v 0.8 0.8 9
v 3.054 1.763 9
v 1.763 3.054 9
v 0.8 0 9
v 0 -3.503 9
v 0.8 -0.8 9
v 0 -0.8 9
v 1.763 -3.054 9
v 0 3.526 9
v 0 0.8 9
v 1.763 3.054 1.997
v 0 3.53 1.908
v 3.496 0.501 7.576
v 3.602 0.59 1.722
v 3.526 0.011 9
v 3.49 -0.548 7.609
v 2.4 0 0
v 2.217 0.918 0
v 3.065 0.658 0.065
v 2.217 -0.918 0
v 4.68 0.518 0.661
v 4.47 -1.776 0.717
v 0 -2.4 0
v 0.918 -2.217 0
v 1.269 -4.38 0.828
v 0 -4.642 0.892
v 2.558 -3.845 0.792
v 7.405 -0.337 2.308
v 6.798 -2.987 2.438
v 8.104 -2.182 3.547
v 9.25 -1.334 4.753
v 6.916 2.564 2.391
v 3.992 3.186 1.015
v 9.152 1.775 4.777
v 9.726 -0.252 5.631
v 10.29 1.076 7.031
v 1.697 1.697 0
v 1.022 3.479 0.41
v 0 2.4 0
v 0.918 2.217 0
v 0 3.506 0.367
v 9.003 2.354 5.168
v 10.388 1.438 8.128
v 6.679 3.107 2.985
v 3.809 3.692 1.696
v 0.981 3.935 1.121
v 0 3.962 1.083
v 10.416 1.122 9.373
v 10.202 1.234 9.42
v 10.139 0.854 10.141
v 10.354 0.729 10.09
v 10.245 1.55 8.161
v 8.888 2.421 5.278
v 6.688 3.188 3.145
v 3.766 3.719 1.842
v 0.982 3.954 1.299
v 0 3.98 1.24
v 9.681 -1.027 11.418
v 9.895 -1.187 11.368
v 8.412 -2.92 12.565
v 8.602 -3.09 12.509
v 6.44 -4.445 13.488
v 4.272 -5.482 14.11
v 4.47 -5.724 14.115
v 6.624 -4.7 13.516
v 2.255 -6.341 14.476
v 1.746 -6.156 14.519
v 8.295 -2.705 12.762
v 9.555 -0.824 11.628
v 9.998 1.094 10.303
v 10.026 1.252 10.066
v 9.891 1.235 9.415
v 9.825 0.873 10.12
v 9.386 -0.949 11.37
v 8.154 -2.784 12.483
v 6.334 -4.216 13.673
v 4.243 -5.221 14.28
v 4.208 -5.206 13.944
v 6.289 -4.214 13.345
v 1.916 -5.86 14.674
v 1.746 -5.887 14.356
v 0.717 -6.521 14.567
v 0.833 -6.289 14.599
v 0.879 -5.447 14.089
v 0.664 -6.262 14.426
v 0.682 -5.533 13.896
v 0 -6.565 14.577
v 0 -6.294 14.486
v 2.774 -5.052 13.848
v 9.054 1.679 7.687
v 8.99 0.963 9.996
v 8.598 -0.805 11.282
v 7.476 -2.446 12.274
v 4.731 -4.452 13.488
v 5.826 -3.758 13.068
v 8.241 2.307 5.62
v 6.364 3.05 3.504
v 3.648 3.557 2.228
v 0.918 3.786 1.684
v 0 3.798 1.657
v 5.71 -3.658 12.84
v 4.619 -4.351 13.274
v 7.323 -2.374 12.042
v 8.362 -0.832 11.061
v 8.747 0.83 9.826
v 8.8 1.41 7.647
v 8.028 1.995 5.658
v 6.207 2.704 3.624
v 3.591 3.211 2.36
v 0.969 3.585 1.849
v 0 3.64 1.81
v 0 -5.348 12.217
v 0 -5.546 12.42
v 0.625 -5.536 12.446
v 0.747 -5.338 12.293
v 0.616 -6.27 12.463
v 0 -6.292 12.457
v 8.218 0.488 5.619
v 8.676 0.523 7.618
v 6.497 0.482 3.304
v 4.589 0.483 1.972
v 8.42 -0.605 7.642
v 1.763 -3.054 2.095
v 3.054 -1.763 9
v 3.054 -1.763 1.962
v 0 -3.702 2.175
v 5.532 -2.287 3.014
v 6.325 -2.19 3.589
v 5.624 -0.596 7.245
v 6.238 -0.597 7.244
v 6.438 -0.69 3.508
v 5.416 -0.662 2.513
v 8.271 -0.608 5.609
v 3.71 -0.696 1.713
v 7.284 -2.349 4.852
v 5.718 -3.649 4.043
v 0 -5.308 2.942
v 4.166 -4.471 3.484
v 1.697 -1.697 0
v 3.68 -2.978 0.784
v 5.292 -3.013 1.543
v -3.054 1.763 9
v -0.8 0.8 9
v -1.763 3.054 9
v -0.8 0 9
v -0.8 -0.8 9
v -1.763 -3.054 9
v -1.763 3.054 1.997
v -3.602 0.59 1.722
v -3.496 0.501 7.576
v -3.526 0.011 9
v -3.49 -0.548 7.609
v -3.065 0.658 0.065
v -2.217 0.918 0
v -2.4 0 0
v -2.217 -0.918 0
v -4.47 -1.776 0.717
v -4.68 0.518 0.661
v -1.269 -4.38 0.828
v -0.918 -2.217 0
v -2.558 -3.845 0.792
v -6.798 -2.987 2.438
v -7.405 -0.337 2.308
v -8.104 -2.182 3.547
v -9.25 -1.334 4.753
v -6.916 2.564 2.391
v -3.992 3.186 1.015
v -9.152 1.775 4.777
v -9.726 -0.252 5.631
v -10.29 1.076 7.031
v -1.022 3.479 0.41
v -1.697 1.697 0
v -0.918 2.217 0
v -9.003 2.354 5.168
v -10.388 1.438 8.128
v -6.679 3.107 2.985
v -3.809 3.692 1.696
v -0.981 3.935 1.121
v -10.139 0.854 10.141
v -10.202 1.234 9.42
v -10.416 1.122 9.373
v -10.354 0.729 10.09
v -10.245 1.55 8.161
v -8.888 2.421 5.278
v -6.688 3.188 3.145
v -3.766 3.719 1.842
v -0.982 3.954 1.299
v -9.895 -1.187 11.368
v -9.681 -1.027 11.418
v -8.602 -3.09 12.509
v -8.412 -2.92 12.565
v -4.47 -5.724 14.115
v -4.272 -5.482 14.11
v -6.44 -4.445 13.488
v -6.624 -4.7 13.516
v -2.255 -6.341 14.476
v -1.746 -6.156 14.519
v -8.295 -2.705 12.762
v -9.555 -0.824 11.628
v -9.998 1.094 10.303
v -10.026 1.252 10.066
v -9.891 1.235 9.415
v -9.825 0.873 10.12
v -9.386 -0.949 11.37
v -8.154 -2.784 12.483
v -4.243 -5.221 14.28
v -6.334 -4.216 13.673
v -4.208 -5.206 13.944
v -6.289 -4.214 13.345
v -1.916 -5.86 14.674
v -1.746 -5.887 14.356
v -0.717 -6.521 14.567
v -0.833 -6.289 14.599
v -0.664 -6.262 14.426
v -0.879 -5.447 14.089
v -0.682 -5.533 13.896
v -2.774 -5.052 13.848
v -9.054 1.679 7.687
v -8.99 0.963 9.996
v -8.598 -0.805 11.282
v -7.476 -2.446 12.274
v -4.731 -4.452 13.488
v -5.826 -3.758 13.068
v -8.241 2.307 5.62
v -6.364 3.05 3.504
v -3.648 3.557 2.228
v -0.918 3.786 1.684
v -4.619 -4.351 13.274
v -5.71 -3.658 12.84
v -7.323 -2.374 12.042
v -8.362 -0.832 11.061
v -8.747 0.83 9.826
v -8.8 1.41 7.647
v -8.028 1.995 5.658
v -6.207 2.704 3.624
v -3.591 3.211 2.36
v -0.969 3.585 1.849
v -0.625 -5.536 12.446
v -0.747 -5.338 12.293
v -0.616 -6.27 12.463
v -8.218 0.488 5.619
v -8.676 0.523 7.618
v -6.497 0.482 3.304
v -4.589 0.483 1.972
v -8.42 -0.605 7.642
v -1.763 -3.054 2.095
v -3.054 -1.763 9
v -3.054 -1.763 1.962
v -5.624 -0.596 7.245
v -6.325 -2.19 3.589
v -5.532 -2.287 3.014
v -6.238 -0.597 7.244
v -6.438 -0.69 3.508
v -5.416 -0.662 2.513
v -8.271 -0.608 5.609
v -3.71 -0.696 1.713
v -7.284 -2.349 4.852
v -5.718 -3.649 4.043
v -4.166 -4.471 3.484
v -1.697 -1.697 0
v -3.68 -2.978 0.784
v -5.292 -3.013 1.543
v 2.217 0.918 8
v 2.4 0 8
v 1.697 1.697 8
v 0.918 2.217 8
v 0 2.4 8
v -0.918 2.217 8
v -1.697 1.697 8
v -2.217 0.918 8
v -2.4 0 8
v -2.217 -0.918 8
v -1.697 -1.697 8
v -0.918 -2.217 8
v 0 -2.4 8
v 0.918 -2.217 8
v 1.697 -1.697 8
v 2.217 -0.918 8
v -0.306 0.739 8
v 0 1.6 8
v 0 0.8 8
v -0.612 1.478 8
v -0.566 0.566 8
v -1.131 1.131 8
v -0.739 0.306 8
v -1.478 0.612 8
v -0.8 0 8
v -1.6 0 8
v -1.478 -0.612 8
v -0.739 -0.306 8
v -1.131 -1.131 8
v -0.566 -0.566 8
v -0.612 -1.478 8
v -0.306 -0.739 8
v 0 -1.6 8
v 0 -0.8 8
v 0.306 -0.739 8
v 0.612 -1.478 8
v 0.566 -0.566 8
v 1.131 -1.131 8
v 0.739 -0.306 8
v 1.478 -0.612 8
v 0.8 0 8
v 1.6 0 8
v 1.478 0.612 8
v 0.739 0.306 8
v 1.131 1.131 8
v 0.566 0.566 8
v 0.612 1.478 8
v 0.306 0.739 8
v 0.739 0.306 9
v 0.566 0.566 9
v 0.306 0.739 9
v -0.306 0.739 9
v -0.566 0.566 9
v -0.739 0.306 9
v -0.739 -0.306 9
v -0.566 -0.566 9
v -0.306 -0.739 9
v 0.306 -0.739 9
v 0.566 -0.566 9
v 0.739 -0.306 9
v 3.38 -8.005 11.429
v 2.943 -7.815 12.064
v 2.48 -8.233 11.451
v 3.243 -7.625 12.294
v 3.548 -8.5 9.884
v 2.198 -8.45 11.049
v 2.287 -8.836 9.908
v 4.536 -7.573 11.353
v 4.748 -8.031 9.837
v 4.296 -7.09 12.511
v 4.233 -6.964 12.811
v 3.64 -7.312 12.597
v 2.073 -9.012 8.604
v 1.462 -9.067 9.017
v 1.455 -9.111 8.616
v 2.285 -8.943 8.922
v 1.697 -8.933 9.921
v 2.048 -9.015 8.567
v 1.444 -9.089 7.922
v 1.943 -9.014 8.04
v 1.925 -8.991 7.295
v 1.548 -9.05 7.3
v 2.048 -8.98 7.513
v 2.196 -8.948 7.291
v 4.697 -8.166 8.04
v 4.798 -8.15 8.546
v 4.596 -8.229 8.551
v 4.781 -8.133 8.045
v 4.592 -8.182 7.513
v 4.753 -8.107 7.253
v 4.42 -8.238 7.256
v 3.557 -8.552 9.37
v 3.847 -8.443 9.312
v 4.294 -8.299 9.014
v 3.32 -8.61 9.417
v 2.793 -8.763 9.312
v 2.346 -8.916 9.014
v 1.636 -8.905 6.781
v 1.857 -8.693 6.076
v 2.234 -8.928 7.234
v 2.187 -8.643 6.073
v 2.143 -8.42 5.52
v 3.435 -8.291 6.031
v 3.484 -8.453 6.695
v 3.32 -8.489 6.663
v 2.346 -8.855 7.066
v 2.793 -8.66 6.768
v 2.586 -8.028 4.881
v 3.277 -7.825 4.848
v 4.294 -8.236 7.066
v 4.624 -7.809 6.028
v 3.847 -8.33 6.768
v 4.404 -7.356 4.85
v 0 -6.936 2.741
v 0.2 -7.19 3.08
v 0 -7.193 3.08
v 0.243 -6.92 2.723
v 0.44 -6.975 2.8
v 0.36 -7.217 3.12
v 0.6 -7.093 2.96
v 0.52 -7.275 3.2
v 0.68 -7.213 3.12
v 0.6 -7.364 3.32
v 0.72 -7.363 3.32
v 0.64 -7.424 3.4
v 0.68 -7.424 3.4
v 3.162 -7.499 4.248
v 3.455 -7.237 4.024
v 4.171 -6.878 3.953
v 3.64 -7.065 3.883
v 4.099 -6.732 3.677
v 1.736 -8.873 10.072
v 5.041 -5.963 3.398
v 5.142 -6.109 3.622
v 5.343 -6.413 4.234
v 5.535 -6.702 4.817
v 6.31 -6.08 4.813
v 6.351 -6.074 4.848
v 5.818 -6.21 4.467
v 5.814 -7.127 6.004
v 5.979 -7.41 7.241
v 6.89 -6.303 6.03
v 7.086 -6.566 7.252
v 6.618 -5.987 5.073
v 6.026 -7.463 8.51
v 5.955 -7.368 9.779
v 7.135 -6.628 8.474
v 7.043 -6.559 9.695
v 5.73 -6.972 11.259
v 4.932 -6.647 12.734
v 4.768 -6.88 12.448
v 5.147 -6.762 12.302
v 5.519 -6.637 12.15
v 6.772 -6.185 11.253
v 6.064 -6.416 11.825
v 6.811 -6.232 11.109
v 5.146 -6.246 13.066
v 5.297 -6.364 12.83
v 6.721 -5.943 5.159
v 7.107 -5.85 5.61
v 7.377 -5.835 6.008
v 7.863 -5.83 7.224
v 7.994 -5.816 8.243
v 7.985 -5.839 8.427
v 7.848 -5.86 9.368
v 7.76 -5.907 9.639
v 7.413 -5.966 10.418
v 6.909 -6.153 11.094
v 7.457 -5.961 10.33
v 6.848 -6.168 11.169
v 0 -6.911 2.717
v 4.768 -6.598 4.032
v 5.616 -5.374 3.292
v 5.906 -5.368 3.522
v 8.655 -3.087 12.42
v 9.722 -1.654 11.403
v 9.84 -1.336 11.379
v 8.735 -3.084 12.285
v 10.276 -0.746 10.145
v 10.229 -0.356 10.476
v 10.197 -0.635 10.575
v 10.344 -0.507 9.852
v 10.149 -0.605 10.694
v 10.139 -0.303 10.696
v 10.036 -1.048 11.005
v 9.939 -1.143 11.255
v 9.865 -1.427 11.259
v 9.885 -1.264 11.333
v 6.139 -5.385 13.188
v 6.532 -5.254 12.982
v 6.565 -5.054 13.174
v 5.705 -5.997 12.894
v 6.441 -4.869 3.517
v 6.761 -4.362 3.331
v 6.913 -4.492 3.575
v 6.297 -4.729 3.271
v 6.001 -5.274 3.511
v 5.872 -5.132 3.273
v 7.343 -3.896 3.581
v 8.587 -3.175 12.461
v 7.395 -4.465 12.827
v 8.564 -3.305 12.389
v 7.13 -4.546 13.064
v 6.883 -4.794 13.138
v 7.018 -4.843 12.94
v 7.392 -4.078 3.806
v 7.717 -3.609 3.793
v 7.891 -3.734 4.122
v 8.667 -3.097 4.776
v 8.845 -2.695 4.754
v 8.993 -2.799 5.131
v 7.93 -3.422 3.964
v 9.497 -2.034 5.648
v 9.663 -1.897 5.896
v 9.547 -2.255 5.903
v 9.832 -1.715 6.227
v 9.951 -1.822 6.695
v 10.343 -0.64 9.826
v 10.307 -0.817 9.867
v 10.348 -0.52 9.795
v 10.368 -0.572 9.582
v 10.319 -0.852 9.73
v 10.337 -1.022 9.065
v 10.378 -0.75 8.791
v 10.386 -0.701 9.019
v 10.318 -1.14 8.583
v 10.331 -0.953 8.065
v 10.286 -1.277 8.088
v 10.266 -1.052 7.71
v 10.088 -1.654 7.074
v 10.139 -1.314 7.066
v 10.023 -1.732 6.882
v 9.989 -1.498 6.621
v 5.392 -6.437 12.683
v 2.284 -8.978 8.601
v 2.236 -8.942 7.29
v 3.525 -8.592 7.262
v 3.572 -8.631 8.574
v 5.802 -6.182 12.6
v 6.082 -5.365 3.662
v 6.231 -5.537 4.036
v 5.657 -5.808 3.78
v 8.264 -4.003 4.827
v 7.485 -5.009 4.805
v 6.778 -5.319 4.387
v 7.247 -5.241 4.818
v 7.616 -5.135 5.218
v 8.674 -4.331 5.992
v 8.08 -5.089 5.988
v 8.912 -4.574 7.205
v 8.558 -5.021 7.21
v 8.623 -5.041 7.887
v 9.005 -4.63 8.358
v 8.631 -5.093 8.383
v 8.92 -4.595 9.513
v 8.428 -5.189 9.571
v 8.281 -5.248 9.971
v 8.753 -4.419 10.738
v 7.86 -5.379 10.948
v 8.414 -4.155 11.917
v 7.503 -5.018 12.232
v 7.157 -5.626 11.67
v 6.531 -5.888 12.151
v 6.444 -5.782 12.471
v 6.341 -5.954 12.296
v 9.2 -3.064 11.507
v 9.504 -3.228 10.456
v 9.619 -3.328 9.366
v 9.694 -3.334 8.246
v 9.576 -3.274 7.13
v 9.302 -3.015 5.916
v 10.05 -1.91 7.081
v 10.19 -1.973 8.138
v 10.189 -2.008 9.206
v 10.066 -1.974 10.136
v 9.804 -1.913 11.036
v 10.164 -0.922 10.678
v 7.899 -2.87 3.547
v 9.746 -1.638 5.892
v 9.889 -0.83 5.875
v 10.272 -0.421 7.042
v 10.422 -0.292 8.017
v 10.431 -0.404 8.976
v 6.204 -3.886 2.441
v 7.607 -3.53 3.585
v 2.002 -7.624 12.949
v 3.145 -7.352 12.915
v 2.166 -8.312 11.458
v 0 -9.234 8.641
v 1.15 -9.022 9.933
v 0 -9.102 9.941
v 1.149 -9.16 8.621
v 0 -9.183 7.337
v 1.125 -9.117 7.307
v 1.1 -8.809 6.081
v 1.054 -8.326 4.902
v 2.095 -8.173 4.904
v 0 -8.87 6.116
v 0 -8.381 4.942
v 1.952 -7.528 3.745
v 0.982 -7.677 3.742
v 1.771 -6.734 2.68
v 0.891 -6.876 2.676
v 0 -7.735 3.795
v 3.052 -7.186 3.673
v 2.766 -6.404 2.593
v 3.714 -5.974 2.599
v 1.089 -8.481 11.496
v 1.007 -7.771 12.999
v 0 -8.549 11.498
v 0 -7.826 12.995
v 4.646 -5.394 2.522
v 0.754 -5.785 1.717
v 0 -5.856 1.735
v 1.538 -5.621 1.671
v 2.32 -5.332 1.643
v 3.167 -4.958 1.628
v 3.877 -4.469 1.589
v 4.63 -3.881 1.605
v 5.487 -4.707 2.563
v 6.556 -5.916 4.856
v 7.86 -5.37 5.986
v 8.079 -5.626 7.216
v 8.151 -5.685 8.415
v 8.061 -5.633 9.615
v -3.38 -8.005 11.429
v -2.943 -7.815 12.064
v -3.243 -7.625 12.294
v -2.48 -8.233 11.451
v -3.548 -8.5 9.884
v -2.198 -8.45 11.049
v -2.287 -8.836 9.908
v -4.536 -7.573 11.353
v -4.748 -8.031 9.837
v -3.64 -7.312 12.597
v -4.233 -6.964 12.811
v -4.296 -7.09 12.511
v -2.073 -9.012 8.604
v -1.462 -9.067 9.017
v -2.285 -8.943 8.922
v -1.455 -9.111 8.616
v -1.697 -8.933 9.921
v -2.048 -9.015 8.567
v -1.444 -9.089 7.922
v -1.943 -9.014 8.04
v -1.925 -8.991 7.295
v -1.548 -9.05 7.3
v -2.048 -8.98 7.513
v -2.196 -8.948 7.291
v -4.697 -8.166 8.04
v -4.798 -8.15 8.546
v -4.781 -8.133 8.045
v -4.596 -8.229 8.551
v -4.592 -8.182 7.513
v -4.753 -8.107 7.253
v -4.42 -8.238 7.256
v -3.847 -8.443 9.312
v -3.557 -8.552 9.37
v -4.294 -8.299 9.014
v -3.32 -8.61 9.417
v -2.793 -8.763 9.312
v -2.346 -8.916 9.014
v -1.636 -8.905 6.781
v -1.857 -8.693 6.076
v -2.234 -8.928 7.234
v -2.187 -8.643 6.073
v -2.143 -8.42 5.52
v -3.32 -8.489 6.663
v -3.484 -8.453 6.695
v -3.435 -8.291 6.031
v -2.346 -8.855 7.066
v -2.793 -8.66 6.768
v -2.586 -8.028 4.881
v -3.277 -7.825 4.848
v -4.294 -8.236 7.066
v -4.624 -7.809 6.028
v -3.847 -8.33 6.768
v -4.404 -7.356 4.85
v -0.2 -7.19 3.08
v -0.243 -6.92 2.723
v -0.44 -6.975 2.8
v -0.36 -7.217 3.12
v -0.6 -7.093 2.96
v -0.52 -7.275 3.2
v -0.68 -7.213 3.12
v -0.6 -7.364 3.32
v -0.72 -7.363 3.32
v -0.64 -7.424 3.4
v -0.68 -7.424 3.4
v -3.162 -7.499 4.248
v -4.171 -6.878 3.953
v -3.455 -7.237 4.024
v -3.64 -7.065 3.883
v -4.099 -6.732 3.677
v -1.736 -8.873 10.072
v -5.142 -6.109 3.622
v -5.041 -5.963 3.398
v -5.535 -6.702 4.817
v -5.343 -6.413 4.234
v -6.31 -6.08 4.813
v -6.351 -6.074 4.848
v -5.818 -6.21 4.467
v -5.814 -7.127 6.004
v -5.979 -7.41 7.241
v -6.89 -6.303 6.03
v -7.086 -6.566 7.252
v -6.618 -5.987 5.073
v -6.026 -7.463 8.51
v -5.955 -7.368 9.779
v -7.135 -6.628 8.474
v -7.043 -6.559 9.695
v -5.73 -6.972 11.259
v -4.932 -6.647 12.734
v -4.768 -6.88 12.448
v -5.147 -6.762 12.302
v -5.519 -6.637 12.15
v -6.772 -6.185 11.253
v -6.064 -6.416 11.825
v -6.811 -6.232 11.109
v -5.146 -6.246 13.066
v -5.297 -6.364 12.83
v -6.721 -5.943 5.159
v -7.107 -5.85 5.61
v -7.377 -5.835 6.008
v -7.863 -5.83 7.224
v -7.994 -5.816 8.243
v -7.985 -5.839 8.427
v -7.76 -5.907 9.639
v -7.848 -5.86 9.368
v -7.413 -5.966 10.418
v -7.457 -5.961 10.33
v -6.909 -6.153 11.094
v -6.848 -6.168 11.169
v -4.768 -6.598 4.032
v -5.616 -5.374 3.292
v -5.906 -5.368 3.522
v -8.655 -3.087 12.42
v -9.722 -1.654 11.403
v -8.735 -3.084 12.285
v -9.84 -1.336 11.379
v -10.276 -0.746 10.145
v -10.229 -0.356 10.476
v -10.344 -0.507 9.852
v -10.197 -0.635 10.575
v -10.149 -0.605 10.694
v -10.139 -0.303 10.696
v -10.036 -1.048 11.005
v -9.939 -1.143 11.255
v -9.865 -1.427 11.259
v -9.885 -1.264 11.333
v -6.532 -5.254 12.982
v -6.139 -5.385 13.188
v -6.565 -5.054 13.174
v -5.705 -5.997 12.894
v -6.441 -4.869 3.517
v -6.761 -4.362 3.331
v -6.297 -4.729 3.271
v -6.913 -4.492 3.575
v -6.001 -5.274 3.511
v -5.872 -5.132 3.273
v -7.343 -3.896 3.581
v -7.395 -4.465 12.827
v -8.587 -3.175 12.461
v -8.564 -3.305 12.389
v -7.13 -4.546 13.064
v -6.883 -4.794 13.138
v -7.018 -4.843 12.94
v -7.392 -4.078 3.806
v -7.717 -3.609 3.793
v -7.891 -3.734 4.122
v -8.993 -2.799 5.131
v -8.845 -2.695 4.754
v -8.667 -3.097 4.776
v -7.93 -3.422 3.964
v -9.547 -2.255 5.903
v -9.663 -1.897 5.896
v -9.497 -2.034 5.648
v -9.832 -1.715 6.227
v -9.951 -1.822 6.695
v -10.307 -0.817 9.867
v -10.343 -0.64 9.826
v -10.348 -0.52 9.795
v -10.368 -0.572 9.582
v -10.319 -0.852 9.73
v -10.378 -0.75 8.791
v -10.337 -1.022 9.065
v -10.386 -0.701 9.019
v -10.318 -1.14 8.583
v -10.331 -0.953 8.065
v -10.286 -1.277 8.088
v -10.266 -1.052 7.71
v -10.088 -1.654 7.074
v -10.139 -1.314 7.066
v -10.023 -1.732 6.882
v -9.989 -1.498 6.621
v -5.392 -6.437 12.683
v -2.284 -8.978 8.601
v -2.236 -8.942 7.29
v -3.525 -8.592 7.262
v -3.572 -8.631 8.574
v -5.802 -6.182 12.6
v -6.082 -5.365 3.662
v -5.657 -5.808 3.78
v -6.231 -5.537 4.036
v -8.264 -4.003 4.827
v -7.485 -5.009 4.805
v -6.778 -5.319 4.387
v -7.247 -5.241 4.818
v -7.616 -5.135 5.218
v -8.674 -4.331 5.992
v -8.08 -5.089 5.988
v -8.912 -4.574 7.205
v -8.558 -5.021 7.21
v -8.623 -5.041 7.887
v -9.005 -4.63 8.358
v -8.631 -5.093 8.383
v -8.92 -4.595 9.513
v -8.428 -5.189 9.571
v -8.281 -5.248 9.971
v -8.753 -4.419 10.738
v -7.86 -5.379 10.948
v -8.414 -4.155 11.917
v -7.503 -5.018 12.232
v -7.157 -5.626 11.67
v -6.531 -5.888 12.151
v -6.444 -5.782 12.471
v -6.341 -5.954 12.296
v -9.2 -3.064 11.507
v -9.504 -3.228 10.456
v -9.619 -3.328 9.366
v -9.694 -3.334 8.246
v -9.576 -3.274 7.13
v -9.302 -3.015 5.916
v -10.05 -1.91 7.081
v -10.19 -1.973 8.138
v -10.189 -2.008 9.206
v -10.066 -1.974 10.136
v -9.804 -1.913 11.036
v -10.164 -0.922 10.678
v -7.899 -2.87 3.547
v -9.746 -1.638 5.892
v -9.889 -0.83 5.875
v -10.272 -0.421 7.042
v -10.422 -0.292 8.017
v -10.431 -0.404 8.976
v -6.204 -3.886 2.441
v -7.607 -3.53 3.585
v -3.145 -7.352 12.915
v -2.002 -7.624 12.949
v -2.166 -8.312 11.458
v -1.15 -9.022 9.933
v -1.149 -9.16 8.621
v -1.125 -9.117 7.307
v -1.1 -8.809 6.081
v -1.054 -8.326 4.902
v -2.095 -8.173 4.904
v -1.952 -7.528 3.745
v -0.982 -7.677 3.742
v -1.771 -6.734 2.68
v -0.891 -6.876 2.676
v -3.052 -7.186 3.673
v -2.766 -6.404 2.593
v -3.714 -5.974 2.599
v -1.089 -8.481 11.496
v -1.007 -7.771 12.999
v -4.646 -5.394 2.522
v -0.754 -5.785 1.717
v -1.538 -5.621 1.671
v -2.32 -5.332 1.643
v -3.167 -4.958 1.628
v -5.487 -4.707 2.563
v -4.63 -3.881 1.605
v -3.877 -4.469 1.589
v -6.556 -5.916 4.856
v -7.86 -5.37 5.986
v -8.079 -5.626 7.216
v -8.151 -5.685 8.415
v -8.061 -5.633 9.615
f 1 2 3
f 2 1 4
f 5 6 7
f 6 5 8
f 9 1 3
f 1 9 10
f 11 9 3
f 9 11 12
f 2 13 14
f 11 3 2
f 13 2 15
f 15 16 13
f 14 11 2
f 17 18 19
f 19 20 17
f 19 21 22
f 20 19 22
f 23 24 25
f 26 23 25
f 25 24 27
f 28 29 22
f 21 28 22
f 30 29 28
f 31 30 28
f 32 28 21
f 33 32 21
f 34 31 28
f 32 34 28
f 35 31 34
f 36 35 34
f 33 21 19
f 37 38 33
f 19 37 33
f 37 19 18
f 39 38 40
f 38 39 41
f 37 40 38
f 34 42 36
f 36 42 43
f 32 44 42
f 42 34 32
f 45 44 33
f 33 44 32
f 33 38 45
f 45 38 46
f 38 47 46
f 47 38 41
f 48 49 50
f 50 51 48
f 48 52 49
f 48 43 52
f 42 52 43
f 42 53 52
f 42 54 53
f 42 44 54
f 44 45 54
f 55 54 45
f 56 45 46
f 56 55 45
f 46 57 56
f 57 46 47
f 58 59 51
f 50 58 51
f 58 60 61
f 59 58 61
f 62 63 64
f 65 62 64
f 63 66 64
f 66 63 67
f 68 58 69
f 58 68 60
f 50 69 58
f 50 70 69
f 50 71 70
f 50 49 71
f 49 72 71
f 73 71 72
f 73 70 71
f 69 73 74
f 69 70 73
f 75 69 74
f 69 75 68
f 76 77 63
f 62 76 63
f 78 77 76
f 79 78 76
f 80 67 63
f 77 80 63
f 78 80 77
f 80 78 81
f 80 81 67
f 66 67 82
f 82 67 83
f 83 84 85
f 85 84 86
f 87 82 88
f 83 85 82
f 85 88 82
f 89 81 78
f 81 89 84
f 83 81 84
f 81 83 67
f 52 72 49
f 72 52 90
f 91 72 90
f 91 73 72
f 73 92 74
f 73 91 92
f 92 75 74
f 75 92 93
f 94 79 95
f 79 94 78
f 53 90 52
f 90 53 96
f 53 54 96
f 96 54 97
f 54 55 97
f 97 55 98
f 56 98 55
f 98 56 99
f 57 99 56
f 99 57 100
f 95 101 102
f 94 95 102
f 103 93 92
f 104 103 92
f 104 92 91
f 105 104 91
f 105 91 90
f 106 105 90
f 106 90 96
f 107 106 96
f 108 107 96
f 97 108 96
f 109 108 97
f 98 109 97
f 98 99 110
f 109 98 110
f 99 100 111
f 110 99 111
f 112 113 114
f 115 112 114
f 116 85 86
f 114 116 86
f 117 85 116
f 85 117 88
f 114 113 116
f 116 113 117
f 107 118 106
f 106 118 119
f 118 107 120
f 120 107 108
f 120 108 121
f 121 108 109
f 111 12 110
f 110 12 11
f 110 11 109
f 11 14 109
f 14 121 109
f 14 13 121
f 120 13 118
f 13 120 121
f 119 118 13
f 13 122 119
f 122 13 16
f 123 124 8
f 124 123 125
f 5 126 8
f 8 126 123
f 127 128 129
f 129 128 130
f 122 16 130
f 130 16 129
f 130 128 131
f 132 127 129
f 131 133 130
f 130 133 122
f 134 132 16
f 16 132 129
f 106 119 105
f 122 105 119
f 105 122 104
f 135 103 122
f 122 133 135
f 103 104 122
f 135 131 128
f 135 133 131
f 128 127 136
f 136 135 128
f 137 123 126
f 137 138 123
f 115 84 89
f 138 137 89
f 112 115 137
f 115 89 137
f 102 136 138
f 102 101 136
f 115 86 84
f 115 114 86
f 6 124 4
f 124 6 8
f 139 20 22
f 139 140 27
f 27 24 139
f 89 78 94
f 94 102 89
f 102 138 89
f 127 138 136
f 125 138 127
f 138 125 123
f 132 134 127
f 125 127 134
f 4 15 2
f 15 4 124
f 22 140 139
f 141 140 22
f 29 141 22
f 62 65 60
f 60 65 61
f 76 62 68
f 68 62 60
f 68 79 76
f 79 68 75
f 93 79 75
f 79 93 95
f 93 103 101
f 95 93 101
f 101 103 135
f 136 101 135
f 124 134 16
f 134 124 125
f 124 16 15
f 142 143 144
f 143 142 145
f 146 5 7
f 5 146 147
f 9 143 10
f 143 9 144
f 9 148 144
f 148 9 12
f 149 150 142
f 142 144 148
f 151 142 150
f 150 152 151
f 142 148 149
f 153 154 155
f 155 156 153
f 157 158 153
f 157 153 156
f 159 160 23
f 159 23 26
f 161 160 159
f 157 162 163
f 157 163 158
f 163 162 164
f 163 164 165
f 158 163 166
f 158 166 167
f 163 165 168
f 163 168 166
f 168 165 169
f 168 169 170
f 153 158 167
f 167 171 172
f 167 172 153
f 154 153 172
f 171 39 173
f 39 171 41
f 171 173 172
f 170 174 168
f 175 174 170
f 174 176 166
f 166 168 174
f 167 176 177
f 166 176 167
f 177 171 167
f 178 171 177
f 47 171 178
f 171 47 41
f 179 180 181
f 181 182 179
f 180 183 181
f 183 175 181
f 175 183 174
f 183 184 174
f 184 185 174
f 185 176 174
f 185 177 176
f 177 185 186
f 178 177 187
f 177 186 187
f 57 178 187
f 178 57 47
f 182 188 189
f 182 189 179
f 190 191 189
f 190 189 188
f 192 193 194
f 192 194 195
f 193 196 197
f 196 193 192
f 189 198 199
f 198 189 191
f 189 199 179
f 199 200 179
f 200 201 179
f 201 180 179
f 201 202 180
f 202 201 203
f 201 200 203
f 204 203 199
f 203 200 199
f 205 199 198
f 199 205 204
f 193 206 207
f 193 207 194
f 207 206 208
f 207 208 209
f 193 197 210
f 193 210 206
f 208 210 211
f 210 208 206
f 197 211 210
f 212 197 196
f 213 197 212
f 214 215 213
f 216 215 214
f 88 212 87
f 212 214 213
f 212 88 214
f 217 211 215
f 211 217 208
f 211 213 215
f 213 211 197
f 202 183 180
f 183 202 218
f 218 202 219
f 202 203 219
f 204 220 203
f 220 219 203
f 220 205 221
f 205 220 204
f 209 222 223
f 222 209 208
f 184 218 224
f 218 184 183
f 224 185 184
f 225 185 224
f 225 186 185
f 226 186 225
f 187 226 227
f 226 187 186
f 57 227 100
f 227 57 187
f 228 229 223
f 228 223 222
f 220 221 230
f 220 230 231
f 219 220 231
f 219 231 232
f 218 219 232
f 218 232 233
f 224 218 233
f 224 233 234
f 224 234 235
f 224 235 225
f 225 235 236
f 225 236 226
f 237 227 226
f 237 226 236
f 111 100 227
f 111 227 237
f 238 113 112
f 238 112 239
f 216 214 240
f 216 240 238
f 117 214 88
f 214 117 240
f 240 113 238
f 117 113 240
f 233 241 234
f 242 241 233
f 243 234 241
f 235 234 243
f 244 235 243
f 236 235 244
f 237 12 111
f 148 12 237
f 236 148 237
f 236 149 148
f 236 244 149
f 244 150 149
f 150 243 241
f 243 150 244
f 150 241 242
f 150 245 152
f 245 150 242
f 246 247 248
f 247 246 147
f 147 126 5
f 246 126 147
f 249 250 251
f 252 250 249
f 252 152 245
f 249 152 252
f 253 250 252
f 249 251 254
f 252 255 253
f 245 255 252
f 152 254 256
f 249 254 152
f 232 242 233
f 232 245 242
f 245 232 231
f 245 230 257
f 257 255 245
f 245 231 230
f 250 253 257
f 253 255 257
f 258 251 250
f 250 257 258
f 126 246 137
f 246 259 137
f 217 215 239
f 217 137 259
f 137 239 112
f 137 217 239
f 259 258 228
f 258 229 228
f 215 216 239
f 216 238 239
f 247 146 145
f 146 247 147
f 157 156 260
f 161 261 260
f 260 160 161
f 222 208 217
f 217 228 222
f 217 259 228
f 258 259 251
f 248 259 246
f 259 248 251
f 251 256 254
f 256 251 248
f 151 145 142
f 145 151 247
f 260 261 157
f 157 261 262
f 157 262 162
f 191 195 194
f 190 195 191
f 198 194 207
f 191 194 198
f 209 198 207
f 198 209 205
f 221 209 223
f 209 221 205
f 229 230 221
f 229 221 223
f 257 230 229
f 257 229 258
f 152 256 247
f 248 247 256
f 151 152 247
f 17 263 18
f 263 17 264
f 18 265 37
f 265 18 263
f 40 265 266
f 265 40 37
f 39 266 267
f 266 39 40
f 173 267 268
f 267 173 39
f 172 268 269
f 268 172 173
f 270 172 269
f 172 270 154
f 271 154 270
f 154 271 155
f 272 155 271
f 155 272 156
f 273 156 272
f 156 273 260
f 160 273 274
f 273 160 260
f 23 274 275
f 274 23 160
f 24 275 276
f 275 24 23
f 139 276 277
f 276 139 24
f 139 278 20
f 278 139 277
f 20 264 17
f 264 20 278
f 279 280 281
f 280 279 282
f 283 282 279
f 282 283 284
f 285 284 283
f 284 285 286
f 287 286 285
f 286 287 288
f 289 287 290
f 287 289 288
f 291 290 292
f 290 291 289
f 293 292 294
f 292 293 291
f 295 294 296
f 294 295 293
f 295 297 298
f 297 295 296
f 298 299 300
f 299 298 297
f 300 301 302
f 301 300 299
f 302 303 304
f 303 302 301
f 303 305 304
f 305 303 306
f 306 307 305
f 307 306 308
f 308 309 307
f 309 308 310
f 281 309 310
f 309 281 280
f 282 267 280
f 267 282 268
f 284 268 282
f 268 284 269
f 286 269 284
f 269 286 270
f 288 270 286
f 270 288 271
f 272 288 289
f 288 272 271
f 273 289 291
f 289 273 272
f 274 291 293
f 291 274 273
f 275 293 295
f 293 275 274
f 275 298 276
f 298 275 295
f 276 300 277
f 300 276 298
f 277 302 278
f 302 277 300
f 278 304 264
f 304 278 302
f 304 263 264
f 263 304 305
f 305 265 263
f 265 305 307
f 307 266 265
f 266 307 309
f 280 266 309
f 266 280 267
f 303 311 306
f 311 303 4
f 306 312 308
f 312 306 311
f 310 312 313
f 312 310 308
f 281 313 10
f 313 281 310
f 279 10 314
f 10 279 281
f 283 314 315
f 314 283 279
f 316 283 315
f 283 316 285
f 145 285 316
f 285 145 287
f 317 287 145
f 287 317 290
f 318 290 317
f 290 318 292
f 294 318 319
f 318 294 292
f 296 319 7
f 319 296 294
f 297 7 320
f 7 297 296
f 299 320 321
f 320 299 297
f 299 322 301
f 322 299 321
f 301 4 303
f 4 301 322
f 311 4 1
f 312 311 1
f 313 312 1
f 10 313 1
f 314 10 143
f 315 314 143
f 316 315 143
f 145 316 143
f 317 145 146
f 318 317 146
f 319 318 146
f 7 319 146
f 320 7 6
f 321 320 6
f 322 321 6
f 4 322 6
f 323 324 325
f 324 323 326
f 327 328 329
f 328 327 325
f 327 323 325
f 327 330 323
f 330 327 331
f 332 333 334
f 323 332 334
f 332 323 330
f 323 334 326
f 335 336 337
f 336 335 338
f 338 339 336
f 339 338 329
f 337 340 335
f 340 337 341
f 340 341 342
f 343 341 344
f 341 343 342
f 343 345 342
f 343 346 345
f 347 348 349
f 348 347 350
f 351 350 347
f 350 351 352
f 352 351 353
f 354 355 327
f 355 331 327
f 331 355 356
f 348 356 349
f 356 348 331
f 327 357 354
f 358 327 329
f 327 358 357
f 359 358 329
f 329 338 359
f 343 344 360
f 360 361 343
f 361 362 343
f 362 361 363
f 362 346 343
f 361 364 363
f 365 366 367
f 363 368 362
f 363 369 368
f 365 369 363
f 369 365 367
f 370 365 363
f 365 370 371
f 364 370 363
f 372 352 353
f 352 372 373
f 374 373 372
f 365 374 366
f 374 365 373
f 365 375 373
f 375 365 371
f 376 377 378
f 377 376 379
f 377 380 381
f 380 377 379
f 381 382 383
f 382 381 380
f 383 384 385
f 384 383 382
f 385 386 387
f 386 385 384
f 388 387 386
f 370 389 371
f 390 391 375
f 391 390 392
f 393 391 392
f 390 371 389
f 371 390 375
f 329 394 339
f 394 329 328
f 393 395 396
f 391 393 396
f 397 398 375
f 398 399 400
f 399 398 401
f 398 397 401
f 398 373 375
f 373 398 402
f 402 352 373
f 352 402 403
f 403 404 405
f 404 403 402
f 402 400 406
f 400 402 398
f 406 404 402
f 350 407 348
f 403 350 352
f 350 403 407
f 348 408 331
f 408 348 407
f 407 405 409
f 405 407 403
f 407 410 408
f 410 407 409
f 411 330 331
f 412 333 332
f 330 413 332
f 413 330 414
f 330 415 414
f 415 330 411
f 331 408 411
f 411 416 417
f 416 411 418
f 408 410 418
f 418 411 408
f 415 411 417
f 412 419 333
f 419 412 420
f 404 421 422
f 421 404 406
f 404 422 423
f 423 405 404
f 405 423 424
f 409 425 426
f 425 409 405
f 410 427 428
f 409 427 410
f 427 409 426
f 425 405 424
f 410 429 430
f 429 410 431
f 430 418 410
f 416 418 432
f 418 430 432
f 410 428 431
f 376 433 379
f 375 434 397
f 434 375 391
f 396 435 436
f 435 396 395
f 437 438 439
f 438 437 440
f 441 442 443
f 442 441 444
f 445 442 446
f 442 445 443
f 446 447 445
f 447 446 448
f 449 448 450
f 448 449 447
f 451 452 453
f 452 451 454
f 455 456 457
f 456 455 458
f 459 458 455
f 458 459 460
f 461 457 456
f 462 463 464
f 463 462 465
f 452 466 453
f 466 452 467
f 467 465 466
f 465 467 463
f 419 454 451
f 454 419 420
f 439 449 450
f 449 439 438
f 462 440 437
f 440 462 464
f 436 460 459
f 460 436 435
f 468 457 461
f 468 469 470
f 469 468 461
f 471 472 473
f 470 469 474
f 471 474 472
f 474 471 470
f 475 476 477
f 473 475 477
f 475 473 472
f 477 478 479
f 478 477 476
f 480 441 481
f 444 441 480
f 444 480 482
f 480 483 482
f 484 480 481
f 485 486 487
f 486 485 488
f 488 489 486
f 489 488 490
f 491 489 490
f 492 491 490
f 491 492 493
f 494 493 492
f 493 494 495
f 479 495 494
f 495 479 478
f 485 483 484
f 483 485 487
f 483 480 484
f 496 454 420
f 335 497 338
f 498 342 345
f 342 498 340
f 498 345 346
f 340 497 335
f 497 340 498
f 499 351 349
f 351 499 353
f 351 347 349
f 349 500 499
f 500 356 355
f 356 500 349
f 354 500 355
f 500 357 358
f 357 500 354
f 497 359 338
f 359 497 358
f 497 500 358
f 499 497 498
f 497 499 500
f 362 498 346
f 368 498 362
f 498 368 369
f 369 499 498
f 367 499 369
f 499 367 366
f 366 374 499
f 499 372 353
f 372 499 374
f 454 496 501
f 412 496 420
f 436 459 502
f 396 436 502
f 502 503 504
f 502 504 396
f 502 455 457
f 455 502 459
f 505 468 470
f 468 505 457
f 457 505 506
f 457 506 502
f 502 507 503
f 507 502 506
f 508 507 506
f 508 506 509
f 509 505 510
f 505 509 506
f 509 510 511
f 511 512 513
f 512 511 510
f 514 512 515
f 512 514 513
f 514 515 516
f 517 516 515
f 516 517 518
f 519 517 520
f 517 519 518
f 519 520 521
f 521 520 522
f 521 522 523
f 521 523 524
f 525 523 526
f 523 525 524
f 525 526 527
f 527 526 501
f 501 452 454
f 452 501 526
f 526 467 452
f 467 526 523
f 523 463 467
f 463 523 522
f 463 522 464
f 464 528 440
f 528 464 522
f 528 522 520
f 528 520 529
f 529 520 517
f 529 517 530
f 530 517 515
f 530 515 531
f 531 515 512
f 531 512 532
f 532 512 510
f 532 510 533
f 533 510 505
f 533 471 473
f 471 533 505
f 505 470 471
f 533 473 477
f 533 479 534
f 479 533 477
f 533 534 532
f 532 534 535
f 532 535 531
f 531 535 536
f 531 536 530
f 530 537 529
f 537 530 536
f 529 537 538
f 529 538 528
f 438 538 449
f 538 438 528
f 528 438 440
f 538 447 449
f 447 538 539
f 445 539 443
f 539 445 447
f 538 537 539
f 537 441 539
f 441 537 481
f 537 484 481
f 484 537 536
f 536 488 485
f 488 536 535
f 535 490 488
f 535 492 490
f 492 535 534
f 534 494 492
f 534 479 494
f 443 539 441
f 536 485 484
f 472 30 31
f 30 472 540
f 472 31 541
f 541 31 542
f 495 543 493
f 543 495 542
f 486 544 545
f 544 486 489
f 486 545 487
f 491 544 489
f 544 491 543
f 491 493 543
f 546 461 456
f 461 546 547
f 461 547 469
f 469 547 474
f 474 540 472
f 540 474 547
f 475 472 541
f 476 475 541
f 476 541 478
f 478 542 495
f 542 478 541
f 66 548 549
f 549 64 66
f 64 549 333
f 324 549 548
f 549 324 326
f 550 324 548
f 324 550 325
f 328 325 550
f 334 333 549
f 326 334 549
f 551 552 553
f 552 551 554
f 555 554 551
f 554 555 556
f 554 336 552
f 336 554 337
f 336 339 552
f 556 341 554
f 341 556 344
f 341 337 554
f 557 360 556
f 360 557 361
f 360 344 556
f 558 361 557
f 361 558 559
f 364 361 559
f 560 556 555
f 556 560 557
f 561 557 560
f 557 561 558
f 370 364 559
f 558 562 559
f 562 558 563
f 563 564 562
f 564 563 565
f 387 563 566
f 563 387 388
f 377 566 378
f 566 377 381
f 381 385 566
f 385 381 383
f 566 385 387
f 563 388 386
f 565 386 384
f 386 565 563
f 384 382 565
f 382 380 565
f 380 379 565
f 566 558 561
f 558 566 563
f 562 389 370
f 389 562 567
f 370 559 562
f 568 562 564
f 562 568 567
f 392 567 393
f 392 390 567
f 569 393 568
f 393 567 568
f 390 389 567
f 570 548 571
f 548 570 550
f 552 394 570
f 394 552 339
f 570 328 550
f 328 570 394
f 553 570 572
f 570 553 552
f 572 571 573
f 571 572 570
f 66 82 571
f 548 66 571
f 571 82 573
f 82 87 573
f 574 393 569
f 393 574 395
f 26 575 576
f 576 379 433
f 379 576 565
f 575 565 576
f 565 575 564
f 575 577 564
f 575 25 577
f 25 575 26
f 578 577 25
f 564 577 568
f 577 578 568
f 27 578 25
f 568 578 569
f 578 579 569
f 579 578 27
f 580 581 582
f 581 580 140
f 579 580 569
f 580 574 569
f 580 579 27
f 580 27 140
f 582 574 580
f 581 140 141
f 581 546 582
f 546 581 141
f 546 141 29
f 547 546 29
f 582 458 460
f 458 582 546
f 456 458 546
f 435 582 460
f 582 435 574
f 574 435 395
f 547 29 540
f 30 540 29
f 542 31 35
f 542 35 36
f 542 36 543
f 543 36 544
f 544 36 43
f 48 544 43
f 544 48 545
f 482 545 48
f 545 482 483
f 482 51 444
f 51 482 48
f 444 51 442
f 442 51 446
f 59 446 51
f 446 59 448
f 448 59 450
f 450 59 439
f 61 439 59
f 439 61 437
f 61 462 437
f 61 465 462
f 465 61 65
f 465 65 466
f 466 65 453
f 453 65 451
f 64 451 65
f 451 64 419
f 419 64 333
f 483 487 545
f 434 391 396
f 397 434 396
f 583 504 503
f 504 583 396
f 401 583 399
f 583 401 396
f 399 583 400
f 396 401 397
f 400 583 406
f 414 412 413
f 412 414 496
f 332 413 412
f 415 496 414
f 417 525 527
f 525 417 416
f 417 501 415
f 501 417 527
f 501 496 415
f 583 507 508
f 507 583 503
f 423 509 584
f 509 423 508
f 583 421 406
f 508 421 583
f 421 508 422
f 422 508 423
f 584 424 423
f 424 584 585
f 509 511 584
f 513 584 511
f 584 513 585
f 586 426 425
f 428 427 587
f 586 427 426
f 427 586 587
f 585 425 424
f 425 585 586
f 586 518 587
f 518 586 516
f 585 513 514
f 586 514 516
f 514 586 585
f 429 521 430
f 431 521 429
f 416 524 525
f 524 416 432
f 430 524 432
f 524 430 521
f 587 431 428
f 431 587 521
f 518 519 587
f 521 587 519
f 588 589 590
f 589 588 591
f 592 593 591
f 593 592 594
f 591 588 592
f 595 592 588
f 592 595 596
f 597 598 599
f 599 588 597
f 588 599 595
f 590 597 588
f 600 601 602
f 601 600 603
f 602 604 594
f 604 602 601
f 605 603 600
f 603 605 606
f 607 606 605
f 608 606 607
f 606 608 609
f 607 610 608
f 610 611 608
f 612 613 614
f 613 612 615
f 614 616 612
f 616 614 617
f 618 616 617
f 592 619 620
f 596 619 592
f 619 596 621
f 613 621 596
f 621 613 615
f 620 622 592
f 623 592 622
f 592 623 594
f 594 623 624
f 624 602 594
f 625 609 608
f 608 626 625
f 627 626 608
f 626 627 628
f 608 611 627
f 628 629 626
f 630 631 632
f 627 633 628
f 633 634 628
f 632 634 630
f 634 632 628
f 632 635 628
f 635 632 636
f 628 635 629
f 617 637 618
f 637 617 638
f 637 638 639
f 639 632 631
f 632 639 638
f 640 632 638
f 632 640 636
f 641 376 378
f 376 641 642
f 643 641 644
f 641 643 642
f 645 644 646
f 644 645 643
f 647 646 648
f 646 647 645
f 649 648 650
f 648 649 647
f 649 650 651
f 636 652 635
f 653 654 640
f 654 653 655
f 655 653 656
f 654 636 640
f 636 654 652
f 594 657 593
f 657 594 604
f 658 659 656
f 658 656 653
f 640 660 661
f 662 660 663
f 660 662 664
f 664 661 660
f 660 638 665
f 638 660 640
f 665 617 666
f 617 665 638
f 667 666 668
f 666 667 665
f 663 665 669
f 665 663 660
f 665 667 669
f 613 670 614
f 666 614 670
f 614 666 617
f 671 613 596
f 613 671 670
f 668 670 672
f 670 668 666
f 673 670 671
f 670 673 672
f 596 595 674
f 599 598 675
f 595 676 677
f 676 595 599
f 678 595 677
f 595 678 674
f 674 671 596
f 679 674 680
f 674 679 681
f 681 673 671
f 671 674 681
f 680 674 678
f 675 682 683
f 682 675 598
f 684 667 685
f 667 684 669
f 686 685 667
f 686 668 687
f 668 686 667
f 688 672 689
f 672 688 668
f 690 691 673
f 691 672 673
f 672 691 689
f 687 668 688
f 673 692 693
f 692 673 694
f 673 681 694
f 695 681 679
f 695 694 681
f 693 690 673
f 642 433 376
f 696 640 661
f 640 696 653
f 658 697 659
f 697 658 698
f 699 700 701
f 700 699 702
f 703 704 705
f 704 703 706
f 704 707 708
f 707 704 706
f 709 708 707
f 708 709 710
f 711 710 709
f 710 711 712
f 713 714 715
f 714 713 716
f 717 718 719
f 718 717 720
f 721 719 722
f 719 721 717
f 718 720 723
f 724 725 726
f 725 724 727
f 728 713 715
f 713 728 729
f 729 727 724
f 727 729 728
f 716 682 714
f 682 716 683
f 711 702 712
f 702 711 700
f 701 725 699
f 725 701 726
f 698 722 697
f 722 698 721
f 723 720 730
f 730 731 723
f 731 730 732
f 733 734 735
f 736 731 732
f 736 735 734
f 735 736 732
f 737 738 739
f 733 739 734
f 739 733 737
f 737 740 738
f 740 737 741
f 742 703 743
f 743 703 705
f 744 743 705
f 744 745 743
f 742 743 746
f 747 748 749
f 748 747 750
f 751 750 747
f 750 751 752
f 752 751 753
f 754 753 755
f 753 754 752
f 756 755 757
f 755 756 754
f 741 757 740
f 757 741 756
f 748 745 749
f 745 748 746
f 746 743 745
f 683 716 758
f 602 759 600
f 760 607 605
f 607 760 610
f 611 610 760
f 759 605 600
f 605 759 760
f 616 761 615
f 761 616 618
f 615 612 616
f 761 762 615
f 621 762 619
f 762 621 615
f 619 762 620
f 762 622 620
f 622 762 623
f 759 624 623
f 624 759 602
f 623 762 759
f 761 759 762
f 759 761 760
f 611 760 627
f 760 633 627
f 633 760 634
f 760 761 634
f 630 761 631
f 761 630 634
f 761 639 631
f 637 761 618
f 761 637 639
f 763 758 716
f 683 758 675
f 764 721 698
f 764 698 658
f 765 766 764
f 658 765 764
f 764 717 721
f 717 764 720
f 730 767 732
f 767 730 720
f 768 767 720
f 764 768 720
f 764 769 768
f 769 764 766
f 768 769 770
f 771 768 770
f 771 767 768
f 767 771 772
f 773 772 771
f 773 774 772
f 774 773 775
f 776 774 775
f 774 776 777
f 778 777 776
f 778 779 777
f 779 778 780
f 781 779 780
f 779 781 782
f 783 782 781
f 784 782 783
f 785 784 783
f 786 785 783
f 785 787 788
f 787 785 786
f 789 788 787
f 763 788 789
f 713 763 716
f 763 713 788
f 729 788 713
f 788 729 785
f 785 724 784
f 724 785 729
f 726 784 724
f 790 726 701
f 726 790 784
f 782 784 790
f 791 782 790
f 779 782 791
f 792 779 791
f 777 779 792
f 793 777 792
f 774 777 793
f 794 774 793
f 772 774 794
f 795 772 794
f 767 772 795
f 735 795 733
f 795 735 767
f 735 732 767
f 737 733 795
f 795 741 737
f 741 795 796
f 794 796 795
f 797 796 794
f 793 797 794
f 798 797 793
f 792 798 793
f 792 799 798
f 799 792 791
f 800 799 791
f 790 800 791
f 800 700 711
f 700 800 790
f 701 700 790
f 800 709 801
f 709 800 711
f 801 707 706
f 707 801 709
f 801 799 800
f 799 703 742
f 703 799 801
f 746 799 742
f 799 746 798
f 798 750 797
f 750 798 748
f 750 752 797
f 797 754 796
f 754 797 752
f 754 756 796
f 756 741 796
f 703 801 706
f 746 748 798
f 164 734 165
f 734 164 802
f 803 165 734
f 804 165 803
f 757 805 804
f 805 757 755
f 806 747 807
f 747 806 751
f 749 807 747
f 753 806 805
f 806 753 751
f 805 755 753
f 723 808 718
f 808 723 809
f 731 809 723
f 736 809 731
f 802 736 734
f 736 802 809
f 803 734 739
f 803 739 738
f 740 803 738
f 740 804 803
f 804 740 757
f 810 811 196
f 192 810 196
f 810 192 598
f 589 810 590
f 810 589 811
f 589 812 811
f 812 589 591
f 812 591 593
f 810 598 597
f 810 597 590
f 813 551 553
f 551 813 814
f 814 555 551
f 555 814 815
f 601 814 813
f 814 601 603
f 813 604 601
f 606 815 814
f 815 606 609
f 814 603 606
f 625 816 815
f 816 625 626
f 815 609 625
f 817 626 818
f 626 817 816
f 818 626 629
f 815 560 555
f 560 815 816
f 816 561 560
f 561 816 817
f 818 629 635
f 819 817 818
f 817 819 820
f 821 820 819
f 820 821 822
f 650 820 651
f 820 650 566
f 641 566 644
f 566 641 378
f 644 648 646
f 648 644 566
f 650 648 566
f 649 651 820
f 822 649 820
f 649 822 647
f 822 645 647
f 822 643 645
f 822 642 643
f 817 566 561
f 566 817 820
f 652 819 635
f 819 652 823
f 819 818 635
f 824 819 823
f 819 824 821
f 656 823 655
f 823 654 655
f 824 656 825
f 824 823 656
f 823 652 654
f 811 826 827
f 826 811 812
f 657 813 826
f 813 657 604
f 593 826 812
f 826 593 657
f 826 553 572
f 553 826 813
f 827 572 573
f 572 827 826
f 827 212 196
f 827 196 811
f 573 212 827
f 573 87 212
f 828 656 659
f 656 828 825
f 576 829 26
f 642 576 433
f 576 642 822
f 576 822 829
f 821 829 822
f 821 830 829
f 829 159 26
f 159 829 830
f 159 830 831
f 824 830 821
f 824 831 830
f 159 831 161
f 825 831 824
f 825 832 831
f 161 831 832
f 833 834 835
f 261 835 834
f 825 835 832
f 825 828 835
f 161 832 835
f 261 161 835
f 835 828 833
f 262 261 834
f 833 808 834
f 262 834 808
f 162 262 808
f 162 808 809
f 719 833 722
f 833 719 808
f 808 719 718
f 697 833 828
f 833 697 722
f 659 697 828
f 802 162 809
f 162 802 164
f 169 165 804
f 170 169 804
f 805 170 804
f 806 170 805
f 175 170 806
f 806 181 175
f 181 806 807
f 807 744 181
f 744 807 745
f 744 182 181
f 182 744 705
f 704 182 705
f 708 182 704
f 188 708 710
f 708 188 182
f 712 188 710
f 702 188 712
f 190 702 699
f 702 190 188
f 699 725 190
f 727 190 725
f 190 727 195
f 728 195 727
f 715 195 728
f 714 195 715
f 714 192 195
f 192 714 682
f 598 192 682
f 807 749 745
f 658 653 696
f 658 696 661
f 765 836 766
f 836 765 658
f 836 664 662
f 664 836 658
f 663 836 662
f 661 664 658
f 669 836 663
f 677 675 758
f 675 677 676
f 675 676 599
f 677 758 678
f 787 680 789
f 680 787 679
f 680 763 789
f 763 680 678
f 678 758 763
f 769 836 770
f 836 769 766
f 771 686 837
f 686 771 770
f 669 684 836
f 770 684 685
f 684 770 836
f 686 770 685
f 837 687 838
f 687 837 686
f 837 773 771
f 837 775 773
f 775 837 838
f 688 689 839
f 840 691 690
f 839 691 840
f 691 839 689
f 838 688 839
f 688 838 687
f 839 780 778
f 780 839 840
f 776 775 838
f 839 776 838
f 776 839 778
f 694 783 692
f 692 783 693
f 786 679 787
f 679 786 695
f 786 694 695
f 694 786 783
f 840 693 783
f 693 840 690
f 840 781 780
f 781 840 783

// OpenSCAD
use <../lib.scad>
use <s/31512p02s01.scad>
use <s/31512s01.scad>
use <s/31512s04.scad>
function ldraw_lib__31512p02() = [
// 0 ~Minifig Head Powerpuff Girls Face with Bubbles Pattern
// 0 Name: 31512p02.dat
// 0 Author: Magnus Forsberg [MagFors]
// 0 !LDRAW_ORG Part UPDATE 2023-05
// 0 !LICENSE Licensed under CC BY 4.0 : see CAreadme.txt
// 
// 0 BFC CERTIFY CCW
  [0,"BFC","CERTIFY"],
  [0,"BFC","CCW"],
// 
// 0 !KEYWORDS set 41287
// 
// 0 !HISTORY 2023-10-31 [OrionP] Official Update 2023-05
// 
// 
// 1 16 0 0 0 1 0 0 0 1 0 0 0 1 s\31512s01.dat
  [1,16,0,0,0,1,0,0,0,1,0,0,0,1, ldraw_lib__s__31512s01()],
// 1 16 0 0 0 1 0 0 0 1 0 0 0 1 s\31512p02s01.dat
  [1,16,0,0,0,1,0,0,0,1,0,0,0,1, ldraw_lib__s__31512p02s01()],
// 1 16 0 0 0 -1 0 0 0 1 0 0 0 1 s\31512p02s01.dat
  [1,16,0,0,0,-1,0,0,0,1,0,0,0,1, ldraw_lib__s__31512p02s01()],
// 1 16 0 0 0 1 0 0 0 1 0 0 0 1 s\31512s04.dat
  [1,16,0,0,0,1,0,0,0,1,0,0,0,1, ldraw_lib__s__31512s04()],
// 1 16 0 0 0 -1 0 0 0 1 0 0 0 1 s\31512s04.dat
  [1,16,0,0,0,-1,0,0,0,1,0,0,0,1, ldraw_lib__s__31512s04()],
];
module ldraw_lib__31512p02(step=0, col=false, unit=2/5, alt=false, line=0.2, solid=!$preview)
    makepoly(ldraw_lib__31512p02(), step=step, col=col, unit=unit, alt=alt, line=line, solid=solid);
ldraw_lib__31512p02(line=0.2);
